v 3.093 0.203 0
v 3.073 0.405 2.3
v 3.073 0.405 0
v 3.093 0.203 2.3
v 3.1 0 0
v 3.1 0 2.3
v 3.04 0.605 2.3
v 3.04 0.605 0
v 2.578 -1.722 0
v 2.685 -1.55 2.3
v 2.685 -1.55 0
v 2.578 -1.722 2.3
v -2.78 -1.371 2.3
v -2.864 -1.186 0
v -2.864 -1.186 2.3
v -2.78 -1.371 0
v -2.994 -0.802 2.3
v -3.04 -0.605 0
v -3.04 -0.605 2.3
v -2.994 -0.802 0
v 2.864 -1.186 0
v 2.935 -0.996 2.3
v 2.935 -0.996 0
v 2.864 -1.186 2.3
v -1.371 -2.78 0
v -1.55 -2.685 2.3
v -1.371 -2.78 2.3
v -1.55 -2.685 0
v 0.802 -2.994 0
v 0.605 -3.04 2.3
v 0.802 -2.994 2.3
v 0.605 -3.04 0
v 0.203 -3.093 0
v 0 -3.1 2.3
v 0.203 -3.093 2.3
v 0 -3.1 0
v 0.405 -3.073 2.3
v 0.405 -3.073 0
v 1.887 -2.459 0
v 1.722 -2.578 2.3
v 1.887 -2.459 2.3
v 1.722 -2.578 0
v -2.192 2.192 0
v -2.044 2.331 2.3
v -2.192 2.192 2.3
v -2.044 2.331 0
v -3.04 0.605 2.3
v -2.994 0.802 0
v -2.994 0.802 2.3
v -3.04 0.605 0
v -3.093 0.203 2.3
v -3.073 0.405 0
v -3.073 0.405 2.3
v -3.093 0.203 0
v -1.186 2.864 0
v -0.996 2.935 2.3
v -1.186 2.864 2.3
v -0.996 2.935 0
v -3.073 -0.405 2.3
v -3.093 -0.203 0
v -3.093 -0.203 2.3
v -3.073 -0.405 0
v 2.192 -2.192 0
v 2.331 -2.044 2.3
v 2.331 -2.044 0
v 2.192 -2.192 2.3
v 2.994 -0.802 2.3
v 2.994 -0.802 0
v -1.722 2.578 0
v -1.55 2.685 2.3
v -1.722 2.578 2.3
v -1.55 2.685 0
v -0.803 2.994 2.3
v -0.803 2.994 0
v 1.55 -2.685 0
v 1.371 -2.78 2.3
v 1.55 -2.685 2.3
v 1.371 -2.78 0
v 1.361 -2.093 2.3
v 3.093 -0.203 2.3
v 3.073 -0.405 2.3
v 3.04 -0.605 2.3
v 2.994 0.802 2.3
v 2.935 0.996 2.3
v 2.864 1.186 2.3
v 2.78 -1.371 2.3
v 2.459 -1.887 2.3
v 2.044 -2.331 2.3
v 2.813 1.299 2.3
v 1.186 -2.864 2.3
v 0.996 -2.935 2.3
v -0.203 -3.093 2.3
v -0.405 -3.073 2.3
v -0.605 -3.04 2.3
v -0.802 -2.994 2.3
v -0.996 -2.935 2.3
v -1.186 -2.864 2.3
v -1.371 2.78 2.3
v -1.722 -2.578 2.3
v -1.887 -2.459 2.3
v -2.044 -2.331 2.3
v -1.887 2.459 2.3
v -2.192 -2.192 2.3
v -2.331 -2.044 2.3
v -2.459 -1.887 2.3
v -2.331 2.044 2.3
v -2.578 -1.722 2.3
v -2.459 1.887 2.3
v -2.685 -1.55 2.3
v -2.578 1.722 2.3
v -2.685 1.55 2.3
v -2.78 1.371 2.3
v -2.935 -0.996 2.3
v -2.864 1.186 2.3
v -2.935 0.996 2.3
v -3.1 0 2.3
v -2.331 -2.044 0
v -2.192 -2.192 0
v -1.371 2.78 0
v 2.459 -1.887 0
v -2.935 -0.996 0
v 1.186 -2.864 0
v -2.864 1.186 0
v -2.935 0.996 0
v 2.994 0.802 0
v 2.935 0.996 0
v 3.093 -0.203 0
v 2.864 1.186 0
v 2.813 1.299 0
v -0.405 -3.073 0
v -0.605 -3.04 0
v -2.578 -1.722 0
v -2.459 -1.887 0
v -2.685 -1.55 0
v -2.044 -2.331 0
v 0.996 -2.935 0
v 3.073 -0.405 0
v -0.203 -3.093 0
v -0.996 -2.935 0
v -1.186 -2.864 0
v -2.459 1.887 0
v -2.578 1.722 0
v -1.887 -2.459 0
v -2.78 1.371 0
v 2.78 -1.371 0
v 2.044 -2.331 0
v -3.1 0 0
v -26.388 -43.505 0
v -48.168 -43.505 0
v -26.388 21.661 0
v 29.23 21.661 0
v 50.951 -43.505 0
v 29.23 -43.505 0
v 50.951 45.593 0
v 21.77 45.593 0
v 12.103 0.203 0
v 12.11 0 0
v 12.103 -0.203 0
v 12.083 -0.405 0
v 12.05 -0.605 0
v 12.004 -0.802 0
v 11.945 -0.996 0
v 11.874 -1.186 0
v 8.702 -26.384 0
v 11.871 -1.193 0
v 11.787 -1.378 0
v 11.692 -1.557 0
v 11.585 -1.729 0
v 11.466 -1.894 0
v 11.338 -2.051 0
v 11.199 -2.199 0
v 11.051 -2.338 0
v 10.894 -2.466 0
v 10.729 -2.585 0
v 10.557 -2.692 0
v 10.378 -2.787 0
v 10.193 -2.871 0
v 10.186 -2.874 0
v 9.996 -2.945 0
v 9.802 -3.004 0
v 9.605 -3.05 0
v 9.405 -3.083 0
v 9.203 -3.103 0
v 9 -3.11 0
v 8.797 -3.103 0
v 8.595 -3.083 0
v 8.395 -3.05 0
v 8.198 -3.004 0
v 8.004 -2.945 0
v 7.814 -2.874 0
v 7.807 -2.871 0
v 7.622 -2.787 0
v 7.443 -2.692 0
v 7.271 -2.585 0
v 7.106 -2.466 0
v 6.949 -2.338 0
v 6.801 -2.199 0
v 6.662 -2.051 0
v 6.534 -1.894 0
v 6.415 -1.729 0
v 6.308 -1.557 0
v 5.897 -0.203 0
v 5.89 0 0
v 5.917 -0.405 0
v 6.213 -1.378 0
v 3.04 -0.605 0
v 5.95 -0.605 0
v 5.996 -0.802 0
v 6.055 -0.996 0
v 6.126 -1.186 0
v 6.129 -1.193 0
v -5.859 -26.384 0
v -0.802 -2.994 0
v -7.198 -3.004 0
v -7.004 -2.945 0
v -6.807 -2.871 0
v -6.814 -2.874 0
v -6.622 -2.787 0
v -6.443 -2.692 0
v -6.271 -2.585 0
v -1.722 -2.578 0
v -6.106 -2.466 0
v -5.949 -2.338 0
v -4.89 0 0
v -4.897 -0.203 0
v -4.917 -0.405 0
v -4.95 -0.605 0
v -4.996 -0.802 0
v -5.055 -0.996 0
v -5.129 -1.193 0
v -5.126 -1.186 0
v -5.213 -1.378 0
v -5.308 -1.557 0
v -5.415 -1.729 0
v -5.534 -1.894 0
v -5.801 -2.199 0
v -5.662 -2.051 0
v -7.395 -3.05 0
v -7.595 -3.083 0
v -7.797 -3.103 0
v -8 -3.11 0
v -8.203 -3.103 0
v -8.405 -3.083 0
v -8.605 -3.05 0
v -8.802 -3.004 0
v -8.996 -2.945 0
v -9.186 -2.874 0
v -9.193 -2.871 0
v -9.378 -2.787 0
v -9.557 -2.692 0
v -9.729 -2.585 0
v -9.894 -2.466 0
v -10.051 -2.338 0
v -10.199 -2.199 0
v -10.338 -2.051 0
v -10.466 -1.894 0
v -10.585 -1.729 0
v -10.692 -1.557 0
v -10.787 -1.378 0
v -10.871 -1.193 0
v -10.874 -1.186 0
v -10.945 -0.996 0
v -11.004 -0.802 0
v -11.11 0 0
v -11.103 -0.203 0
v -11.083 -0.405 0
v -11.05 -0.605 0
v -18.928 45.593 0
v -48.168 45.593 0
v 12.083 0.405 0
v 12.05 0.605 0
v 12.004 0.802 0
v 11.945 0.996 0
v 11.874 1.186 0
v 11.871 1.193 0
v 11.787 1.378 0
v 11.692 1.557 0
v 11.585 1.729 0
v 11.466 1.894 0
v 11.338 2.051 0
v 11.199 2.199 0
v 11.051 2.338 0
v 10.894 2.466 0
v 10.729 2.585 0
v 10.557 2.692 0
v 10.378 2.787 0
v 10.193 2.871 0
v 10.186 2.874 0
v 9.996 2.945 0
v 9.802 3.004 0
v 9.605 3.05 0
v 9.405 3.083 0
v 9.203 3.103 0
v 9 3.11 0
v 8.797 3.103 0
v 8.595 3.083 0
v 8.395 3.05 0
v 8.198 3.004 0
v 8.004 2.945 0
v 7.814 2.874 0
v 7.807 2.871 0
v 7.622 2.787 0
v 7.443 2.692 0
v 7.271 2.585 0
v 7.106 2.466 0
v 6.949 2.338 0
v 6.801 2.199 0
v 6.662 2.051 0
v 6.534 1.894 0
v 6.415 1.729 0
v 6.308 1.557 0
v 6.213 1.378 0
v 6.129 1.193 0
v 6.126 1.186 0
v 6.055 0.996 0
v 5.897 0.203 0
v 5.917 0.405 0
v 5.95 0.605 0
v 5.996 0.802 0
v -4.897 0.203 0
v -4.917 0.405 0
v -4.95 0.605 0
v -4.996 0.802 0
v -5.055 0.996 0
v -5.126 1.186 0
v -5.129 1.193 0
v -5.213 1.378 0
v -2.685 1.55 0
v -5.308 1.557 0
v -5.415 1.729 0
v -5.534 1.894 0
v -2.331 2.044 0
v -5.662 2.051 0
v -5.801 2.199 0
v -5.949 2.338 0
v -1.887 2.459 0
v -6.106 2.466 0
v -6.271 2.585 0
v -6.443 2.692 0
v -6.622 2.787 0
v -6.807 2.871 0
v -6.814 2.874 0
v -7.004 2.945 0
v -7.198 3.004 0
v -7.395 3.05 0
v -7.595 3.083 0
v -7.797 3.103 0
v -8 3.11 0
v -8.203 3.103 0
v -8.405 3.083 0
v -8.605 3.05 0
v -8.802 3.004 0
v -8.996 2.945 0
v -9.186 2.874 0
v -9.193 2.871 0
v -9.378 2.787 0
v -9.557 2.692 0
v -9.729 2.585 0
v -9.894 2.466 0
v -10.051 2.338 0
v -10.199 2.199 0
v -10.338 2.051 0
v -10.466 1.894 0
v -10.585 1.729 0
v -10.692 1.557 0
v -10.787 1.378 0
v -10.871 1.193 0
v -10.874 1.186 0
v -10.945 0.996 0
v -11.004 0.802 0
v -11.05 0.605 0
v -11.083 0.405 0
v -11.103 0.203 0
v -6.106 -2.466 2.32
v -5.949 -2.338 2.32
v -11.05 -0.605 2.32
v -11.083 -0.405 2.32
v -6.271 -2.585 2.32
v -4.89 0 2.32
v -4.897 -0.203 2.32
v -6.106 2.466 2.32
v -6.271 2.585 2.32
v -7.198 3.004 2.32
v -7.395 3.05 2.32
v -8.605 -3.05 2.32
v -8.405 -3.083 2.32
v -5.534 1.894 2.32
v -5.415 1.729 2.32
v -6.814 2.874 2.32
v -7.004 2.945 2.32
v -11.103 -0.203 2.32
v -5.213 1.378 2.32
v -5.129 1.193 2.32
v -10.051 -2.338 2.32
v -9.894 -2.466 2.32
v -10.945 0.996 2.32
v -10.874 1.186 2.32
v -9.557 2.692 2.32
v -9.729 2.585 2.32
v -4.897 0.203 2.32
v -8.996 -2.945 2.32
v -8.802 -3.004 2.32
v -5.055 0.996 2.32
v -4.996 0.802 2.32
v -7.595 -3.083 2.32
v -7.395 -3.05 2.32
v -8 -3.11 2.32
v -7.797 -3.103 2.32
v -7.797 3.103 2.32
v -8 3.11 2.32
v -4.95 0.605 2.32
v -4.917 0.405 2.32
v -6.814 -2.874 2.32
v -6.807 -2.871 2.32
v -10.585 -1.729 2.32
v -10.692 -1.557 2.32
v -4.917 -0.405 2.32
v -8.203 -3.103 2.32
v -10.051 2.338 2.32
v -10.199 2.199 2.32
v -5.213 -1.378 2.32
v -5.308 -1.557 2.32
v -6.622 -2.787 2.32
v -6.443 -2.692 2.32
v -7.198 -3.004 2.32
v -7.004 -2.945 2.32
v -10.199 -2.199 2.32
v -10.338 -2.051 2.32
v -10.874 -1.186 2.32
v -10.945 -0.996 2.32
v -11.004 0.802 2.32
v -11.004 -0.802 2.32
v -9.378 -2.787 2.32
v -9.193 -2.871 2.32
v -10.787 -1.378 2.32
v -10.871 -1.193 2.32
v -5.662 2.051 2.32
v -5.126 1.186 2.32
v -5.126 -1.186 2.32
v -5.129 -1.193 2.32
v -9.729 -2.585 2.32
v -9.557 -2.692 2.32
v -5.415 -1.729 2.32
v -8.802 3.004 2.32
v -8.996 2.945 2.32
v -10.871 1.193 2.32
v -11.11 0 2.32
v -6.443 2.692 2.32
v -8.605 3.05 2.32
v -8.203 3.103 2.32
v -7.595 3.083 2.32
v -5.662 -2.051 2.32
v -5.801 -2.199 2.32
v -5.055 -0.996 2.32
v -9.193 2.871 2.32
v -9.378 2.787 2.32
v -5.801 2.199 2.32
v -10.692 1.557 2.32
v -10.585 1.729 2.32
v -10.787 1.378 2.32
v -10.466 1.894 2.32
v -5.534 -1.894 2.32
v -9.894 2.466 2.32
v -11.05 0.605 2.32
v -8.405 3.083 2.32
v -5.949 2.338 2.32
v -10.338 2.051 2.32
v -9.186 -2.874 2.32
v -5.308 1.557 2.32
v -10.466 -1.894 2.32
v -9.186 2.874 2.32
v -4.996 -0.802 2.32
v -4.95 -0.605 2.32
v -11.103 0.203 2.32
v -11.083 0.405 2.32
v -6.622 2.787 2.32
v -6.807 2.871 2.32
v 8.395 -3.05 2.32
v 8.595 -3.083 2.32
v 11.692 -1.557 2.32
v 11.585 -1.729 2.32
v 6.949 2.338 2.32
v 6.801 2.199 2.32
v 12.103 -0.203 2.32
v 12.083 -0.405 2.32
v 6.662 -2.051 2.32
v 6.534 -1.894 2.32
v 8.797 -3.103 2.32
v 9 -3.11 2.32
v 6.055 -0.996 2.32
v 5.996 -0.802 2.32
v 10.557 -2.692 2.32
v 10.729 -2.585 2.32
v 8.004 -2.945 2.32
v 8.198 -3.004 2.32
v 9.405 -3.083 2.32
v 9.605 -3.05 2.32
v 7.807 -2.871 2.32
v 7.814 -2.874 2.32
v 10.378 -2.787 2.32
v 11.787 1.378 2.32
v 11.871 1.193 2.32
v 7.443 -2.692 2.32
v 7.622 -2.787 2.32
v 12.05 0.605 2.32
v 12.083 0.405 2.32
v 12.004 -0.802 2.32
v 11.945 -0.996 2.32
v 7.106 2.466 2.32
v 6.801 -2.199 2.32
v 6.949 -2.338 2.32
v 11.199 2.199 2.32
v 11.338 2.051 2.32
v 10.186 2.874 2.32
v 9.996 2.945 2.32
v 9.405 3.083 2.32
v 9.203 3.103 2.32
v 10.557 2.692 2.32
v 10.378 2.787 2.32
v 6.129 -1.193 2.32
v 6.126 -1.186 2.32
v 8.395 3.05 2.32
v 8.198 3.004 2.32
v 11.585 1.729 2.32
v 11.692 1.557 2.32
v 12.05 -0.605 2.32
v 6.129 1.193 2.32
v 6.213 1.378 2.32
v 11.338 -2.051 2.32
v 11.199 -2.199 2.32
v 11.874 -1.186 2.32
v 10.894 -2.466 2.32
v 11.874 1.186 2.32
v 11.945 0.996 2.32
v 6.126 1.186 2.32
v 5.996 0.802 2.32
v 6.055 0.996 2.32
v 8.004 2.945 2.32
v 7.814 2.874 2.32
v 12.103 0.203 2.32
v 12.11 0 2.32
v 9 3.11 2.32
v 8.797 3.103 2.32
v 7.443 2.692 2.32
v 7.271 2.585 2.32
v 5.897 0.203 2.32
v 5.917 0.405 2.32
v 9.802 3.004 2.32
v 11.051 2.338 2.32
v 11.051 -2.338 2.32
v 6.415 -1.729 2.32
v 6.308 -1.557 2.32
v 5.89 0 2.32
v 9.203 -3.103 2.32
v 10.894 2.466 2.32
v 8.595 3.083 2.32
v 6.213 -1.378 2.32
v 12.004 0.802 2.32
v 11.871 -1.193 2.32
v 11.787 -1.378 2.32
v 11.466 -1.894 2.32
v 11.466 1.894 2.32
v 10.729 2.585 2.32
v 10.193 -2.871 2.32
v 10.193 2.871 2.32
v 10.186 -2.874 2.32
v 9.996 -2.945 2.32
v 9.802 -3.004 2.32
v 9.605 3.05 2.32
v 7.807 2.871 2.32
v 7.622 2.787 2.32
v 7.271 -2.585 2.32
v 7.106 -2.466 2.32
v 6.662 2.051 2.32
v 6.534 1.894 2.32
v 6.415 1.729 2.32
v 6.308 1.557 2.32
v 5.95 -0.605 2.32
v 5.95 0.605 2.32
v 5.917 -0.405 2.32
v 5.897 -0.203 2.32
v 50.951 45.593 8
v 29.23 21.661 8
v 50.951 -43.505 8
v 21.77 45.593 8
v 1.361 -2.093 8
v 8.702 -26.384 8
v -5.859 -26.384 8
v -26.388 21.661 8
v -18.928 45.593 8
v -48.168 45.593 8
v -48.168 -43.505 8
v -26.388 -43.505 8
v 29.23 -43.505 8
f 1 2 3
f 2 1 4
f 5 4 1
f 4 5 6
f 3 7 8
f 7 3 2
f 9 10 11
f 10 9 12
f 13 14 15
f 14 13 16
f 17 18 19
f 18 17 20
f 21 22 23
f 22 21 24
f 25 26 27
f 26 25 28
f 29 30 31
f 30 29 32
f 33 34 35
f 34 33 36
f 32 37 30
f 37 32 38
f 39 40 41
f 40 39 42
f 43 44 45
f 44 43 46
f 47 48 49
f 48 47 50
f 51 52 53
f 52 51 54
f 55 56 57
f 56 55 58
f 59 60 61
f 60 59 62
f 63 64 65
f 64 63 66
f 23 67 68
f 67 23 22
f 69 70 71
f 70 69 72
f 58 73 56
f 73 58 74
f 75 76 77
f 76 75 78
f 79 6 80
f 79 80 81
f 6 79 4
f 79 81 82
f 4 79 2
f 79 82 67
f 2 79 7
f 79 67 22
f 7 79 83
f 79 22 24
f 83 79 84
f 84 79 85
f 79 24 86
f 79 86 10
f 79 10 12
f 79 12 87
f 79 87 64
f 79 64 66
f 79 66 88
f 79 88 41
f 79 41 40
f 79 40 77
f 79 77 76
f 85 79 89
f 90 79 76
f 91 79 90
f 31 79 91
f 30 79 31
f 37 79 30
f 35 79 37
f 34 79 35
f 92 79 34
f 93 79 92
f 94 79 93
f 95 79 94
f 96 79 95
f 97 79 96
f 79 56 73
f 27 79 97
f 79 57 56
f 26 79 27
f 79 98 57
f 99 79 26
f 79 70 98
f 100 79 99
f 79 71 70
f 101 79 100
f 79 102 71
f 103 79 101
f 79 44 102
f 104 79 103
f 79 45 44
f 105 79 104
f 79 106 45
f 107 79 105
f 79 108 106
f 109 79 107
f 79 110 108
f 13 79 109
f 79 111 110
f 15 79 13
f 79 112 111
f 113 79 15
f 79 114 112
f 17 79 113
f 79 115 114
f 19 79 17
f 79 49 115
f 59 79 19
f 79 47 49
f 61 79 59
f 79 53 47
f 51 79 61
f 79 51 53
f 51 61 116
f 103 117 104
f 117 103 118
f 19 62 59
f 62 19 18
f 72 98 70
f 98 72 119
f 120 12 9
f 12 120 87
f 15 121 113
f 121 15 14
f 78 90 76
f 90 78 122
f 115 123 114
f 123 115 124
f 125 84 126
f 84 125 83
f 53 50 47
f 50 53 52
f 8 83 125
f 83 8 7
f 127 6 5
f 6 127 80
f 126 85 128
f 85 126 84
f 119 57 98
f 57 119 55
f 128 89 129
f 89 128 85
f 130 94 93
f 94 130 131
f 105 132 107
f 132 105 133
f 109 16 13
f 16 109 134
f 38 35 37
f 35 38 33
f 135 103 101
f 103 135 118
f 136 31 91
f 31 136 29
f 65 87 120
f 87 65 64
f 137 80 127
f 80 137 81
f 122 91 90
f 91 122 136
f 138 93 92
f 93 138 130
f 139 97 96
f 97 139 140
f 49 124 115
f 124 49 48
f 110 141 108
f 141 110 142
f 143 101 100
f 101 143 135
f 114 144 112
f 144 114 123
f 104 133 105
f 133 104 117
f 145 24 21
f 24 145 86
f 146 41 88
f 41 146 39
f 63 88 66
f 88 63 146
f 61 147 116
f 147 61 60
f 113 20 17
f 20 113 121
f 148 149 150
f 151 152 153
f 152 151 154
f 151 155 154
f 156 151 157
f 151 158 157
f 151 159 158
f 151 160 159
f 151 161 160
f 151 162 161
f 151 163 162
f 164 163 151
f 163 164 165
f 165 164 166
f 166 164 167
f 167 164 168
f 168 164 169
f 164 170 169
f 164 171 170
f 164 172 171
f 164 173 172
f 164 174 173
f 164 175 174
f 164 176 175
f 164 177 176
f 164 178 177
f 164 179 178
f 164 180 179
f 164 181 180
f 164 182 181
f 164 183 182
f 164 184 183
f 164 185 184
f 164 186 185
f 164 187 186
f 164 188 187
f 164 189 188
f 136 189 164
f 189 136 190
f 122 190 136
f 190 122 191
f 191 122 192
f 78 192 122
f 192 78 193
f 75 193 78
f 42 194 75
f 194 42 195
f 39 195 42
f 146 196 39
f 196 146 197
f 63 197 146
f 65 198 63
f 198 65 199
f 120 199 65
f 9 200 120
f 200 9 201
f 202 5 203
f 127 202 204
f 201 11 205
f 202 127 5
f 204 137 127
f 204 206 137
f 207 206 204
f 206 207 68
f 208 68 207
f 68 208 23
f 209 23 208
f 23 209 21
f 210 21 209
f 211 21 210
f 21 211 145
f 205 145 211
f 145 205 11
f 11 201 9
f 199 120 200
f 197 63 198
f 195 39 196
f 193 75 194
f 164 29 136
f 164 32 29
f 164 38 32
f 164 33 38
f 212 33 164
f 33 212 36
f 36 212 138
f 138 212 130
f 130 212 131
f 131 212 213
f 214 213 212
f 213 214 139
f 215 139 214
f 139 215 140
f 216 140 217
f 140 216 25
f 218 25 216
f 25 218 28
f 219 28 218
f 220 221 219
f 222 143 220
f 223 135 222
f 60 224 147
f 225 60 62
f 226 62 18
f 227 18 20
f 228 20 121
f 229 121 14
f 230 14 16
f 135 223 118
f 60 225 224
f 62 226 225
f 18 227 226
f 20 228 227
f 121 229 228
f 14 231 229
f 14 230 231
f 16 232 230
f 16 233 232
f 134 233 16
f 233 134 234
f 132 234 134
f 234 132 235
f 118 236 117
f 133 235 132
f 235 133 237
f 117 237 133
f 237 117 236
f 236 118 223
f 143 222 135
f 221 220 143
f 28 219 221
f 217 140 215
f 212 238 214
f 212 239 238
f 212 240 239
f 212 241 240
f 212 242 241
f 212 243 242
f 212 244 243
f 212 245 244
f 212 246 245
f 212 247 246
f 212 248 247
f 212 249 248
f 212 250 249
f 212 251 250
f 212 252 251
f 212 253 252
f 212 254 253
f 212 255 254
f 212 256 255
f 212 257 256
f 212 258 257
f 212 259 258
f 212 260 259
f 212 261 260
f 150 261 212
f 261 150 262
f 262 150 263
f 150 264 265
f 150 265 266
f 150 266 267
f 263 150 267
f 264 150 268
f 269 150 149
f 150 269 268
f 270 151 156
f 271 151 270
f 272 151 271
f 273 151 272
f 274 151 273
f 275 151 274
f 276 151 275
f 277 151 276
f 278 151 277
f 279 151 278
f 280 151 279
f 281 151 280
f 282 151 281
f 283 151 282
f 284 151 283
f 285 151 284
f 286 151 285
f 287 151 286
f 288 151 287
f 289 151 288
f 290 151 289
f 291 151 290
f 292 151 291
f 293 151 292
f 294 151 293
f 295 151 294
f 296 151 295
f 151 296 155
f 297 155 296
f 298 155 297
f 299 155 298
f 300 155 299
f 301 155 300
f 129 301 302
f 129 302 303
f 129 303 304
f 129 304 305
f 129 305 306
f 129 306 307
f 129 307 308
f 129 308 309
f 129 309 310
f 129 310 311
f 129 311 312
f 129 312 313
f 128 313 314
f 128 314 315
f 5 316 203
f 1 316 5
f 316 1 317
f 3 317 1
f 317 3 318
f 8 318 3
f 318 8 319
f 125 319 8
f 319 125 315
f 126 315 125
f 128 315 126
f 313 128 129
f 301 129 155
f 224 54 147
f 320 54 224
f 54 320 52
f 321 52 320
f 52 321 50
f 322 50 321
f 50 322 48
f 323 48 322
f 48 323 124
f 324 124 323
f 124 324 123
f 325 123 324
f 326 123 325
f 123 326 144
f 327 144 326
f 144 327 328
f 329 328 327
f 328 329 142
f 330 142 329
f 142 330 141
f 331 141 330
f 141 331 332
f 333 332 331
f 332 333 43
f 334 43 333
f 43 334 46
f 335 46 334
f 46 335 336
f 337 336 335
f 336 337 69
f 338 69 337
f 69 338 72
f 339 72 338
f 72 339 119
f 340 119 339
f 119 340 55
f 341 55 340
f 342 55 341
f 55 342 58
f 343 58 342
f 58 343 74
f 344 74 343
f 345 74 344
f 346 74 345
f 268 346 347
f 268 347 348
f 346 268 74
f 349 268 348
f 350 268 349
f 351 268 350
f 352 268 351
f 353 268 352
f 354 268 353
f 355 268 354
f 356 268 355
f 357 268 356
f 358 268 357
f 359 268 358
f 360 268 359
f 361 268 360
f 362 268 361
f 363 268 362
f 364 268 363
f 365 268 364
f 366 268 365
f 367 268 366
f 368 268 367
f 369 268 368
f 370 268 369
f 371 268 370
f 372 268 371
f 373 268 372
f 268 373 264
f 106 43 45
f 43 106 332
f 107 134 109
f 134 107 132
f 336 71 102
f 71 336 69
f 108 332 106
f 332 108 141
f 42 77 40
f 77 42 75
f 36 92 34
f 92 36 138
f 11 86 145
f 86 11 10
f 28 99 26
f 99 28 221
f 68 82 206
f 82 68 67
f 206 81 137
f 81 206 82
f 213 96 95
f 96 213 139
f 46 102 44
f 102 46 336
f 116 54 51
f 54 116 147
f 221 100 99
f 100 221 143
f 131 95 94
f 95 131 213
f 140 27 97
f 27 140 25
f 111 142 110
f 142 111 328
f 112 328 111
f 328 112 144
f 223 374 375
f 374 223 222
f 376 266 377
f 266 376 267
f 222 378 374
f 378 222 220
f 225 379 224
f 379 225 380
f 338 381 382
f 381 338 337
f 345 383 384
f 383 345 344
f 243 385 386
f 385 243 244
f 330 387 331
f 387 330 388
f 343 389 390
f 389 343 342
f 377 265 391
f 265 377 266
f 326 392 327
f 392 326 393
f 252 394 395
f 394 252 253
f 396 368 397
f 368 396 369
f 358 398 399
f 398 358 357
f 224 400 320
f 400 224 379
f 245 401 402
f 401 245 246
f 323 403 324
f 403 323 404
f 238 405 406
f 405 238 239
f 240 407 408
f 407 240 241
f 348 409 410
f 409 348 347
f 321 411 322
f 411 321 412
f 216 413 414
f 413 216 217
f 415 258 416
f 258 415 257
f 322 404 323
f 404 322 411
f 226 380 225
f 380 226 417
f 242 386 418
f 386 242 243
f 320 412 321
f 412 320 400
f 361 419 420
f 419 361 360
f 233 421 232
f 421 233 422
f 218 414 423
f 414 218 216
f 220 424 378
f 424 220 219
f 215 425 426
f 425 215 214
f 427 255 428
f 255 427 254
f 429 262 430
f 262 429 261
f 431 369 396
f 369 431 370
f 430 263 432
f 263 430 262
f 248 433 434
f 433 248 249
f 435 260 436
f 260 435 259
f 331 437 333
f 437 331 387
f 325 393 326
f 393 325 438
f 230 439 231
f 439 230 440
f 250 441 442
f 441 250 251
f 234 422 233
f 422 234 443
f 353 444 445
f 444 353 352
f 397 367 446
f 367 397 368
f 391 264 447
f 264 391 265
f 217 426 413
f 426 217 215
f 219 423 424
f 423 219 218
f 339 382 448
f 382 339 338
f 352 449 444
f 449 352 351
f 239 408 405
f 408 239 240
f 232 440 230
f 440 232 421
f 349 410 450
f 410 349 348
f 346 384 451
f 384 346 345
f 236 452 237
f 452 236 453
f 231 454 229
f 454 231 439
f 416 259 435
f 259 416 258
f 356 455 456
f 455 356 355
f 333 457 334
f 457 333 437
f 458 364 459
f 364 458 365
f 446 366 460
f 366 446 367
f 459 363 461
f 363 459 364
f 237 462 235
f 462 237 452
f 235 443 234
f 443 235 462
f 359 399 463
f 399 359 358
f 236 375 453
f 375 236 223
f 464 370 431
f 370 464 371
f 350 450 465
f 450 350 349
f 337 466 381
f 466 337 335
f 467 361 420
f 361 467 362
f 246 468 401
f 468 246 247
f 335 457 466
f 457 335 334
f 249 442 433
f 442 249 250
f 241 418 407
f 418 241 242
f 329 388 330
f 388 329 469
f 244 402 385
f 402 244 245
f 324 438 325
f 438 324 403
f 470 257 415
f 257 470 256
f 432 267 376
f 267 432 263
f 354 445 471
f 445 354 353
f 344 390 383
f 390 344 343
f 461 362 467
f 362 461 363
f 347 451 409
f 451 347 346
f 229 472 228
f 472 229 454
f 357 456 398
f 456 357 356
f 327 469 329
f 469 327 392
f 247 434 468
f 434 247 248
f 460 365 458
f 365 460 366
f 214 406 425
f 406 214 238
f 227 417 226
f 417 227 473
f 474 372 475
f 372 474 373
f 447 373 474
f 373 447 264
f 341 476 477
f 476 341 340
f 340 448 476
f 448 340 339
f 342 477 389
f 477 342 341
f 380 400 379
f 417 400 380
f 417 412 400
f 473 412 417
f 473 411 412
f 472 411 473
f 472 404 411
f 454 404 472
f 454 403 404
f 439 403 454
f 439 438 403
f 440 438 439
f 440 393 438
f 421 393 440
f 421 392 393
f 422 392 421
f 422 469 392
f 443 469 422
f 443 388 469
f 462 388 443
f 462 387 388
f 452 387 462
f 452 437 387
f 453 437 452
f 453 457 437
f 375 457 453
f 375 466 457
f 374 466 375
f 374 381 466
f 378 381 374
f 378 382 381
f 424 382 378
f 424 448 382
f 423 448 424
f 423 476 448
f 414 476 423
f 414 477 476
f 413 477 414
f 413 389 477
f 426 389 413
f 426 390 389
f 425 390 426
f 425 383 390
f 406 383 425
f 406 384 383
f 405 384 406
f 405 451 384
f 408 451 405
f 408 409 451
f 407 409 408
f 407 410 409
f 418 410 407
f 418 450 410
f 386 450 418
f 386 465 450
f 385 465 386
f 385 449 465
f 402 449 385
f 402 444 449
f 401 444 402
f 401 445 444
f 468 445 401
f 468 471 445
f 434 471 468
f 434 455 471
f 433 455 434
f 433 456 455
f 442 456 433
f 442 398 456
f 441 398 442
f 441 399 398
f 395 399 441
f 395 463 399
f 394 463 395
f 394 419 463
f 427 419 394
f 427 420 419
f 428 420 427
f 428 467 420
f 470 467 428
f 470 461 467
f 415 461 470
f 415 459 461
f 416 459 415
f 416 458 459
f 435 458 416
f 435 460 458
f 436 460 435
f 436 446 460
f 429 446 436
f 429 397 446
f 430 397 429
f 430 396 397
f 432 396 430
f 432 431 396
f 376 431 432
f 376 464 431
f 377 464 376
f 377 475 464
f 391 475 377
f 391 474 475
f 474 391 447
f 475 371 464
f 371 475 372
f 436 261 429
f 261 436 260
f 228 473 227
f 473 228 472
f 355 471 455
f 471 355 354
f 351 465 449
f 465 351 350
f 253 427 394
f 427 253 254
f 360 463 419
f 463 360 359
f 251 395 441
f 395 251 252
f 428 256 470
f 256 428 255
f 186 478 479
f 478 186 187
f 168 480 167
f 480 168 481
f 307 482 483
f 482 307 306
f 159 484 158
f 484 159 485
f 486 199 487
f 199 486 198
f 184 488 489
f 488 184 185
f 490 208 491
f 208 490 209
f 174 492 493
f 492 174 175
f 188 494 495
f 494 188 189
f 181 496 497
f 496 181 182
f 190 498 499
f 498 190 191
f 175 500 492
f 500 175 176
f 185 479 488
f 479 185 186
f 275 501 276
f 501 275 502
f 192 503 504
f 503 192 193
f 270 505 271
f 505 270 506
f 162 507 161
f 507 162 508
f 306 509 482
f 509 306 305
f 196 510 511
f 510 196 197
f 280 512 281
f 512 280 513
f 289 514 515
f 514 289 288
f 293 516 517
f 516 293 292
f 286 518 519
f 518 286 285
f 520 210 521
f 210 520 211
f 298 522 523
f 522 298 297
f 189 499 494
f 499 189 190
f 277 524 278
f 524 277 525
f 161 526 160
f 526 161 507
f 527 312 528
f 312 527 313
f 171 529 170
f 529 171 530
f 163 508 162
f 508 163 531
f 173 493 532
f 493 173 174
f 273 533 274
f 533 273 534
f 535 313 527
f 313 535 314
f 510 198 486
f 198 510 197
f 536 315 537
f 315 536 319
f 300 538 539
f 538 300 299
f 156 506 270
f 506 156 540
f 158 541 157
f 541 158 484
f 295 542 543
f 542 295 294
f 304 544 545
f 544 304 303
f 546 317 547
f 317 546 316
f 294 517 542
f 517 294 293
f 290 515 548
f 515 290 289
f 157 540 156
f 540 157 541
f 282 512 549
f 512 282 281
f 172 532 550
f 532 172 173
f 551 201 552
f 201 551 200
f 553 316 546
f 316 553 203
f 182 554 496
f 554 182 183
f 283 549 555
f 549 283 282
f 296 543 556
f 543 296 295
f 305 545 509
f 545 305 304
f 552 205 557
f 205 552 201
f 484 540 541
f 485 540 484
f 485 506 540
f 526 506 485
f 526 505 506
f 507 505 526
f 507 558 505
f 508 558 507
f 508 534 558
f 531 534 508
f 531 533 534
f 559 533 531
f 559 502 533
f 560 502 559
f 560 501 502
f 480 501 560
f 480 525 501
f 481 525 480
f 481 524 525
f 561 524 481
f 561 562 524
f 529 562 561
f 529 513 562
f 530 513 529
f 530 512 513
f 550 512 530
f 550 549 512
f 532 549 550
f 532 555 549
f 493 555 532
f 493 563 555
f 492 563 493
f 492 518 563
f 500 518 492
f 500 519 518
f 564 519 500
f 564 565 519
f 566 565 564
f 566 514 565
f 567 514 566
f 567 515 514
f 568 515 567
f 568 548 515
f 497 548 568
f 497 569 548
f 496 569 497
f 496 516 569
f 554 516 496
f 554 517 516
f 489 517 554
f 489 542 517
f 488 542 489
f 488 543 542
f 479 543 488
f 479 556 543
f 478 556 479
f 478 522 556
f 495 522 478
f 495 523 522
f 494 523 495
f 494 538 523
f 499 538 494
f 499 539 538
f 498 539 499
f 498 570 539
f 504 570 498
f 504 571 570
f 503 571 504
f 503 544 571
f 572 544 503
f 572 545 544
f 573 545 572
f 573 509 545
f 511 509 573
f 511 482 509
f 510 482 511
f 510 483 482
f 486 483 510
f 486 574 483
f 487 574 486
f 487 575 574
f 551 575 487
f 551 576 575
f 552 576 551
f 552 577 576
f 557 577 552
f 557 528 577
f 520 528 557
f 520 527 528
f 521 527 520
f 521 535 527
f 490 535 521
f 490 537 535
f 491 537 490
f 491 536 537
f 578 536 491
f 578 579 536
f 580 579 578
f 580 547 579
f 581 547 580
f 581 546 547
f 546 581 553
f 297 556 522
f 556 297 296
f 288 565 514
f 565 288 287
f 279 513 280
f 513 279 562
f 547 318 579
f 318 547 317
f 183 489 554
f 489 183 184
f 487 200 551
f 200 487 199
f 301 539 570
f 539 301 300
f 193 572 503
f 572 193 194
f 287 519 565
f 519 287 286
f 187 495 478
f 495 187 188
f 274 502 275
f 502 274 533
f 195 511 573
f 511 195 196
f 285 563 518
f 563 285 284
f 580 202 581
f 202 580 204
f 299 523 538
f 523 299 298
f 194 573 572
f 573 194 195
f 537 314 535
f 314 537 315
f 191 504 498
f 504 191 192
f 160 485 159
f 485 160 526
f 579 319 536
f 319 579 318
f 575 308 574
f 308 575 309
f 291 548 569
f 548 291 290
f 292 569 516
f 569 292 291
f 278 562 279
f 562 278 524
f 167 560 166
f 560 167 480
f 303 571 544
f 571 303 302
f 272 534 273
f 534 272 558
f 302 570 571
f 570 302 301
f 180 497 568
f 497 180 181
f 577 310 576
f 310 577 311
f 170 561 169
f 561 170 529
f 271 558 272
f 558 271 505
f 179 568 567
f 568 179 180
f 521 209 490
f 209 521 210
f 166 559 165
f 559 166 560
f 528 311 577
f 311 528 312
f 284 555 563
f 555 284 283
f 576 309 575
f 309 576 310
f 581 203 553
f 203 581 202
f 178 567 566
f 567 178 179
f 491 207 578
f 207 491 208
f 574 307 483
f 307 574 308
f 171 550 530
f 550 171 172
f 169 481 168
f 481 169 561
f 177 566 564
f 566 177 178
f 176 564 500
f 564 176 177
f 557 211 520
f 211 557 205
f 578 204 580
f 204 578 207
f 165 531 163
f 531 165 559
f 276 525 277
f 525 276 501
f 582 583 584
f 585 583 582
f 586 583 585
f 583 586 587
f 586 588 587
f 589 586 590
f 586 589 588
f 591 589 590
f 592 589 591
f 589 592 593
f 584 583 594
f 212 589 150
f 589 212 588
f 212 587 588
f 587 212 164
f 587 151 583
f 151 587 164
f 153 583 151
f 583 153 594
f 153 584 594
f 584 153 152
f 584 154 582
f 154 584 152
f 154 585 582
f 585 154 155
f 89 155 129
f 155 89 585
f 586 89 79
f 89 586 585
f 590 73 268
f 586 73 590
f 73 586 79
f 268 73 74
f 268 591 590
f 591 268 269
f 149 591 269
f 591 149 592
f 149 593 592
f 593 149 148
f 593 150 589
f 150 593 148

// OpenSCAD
// Magnetic Letters Pro
// Forge3D curated example adapted from the built-in sample

letter = "M";
font_name = "Bahnschrift:style=Bold";
letter_size = 88;
letter_thickness = 8;
shape_mode = "glyph"; // glyph | tile
tile_margin = 4;

magnet_d = 6.2;
magnet_depth = 2.3;
edge_clearance = 0.8;
max_magnets = 5;
magnet_mode = "smart"; // smart | auto_grid | spine | manual
manual_positions = [[-18, 16], [16, -16], [0, 0]];
grid_pitch = 13;
grid_extent = 42;
spine_samples = 7;
spine_y_span = 30;

$fn = $preview ? 28 : 96;

module glyph_2d() {
  text(letter, size = letter_size, font = font_name, halign = "center", valign = "center");
}

module printable_shape_2d() {
  if (shape_mode == "tile") {
    offset(delta = tile_margin) glyph_2d();
  } else {
    glyph_2d();
  }
}

module safe_mask_2d() {
  offset(r = -(magnet_d / 2 + edge_clearance)) printable_shape_2d();
}

module letter_body() {
  linear_extrude(height = letter_thickness) printable_shape_2d();
}

function ring_candidates(r, pitch) =
  r == 0 ? [[0, 0]] :
  concat(
    [for (x = [-r : r]) [x * pitch, -r * pitch]],
    [for (y = [-r + 1 : r]) [r * pitch, y * pitch]],
    [for (x = [r - 1 : -1 : -r]) [x * pitch, r * pitch]],
    [for (y = [r - 1 : -1 : -r + 1]) [-r * pitch, y * pitch]]
  );

function grid_candidates(extent, pitch) =
  [for (ring = [0 : floor(extent / pitch)], pt = ring_candidates(ring, pitch))
    if (abs(pt[0]) <= extent && abs(pt[1]) <= extent) pt];

function smart_candidates(ch) =
  ch == "A" ? [[-20, -20], [20, -20], [0, -5]] :
  ch == "B" ? [[-24, 18], [-24, -15], [14, 18], [14, -8]] :
  ch == "C" ? [[-30, 0], [0, 26], [0, -26]] :
  ch == "D" ? [[-24, 18], [-24, -18], [20, 0]] :
  ch == "E" ? [[-24, 20], [-24, -20], [10, 24], [10, -24]] :
  ch == "F" ? [[-24, 20], [-24, -8], [10, 26]] :
  ch == "G" ? [[-30, 0], [0, 26], [20, -8]] :
  ch == "H" ? [[-24, 15], [-24, -15], [24, 15], [24, -15]] :
  ch == "I" ? [[0, 18], [0, -18]] :
  ch == "J" ? [[16, 22], [0, -24]] :
  ch == "K" ? [[-24, 15], [-24, -15], [14, 22], [14, -22]] :
  ch == "L" ? [[-24, 18], [-24, -8], [12, -28]] :
  ch == "M" ? [[-30, 0], [-8, 0], [9, 0], [30, 0]] :
  ch == "N" ? [[-24, 15], [-24, -15], [24, 15], [24, -15]] :
  ch == "O" ? [[-28, 0], [28, 0], [0, 24], [0, -24]] :
  ch == "P" ? [[-24, 15], [-24, -20], [16, 18]] :
  ch == "Q" ? [[-28, 0], [0, 24], [24, -15]] :
  ch == "R" ? [[-24, 15], [-24, -20], [16, 18], [16, -20]] :
  ch == "S" ? [[-12, 20], [12, -20]] :
  ch == "T" ? [[-26, 28], [26, 28], [0, -10]] :
  ch == "U" ? [[-24, 15], [24, 15], [0, -26]] :
  ch == "V" ? [[-22, 22], [22, 22]] :
  ch == "W" ? [[-30, 5], [-10, -18], [10, -18], [30, 5]] :
  ch == "X" ? [[-18, 22], [18, 22], [-18, -22], [18, -22]] :
  ch == "Y" ? [[-22, 22], [22, 22], [0, -16]] :
  ch == "Z" ? [[10, 28], [0, 0], [-10, -28]] :
  [];

function spine_candidates(n, y_span) =
  [for (i = [0 : n - 1]) [0, y_span * (i / max(n - 1, 1) - 0.5)]];

module validated_pocket(point) {
  minkowski() {
    intersection() {
      linear_extrude(height = 0.02) safe_mask_2d();
      translate([point[0], point[1], 0]) cylinder(h = 0.02, r = 0.01, $fn = 8);
    }
    cylinder(h = magnet_depth, d = magnet_d);
  }
}

module pocket_candidates() {
  pts = magnet_mode == "manual" ? manual_positions
    : magnet_mode == "spine" ? spine_candidates(spine_samples, spine_y_span)
    : magnet_mode == "smart" ? smart_candidates(letter)
    : grid_candidates(grid_extent, grid_pitch);

  for (i = [0 : min(max_magnets, len(pts)) - 1]) {
    validated_pocket(pts[i]);
  }
}

difference() {
  color("Gainsboro") letter_body();
  pocket_candidates();
}
